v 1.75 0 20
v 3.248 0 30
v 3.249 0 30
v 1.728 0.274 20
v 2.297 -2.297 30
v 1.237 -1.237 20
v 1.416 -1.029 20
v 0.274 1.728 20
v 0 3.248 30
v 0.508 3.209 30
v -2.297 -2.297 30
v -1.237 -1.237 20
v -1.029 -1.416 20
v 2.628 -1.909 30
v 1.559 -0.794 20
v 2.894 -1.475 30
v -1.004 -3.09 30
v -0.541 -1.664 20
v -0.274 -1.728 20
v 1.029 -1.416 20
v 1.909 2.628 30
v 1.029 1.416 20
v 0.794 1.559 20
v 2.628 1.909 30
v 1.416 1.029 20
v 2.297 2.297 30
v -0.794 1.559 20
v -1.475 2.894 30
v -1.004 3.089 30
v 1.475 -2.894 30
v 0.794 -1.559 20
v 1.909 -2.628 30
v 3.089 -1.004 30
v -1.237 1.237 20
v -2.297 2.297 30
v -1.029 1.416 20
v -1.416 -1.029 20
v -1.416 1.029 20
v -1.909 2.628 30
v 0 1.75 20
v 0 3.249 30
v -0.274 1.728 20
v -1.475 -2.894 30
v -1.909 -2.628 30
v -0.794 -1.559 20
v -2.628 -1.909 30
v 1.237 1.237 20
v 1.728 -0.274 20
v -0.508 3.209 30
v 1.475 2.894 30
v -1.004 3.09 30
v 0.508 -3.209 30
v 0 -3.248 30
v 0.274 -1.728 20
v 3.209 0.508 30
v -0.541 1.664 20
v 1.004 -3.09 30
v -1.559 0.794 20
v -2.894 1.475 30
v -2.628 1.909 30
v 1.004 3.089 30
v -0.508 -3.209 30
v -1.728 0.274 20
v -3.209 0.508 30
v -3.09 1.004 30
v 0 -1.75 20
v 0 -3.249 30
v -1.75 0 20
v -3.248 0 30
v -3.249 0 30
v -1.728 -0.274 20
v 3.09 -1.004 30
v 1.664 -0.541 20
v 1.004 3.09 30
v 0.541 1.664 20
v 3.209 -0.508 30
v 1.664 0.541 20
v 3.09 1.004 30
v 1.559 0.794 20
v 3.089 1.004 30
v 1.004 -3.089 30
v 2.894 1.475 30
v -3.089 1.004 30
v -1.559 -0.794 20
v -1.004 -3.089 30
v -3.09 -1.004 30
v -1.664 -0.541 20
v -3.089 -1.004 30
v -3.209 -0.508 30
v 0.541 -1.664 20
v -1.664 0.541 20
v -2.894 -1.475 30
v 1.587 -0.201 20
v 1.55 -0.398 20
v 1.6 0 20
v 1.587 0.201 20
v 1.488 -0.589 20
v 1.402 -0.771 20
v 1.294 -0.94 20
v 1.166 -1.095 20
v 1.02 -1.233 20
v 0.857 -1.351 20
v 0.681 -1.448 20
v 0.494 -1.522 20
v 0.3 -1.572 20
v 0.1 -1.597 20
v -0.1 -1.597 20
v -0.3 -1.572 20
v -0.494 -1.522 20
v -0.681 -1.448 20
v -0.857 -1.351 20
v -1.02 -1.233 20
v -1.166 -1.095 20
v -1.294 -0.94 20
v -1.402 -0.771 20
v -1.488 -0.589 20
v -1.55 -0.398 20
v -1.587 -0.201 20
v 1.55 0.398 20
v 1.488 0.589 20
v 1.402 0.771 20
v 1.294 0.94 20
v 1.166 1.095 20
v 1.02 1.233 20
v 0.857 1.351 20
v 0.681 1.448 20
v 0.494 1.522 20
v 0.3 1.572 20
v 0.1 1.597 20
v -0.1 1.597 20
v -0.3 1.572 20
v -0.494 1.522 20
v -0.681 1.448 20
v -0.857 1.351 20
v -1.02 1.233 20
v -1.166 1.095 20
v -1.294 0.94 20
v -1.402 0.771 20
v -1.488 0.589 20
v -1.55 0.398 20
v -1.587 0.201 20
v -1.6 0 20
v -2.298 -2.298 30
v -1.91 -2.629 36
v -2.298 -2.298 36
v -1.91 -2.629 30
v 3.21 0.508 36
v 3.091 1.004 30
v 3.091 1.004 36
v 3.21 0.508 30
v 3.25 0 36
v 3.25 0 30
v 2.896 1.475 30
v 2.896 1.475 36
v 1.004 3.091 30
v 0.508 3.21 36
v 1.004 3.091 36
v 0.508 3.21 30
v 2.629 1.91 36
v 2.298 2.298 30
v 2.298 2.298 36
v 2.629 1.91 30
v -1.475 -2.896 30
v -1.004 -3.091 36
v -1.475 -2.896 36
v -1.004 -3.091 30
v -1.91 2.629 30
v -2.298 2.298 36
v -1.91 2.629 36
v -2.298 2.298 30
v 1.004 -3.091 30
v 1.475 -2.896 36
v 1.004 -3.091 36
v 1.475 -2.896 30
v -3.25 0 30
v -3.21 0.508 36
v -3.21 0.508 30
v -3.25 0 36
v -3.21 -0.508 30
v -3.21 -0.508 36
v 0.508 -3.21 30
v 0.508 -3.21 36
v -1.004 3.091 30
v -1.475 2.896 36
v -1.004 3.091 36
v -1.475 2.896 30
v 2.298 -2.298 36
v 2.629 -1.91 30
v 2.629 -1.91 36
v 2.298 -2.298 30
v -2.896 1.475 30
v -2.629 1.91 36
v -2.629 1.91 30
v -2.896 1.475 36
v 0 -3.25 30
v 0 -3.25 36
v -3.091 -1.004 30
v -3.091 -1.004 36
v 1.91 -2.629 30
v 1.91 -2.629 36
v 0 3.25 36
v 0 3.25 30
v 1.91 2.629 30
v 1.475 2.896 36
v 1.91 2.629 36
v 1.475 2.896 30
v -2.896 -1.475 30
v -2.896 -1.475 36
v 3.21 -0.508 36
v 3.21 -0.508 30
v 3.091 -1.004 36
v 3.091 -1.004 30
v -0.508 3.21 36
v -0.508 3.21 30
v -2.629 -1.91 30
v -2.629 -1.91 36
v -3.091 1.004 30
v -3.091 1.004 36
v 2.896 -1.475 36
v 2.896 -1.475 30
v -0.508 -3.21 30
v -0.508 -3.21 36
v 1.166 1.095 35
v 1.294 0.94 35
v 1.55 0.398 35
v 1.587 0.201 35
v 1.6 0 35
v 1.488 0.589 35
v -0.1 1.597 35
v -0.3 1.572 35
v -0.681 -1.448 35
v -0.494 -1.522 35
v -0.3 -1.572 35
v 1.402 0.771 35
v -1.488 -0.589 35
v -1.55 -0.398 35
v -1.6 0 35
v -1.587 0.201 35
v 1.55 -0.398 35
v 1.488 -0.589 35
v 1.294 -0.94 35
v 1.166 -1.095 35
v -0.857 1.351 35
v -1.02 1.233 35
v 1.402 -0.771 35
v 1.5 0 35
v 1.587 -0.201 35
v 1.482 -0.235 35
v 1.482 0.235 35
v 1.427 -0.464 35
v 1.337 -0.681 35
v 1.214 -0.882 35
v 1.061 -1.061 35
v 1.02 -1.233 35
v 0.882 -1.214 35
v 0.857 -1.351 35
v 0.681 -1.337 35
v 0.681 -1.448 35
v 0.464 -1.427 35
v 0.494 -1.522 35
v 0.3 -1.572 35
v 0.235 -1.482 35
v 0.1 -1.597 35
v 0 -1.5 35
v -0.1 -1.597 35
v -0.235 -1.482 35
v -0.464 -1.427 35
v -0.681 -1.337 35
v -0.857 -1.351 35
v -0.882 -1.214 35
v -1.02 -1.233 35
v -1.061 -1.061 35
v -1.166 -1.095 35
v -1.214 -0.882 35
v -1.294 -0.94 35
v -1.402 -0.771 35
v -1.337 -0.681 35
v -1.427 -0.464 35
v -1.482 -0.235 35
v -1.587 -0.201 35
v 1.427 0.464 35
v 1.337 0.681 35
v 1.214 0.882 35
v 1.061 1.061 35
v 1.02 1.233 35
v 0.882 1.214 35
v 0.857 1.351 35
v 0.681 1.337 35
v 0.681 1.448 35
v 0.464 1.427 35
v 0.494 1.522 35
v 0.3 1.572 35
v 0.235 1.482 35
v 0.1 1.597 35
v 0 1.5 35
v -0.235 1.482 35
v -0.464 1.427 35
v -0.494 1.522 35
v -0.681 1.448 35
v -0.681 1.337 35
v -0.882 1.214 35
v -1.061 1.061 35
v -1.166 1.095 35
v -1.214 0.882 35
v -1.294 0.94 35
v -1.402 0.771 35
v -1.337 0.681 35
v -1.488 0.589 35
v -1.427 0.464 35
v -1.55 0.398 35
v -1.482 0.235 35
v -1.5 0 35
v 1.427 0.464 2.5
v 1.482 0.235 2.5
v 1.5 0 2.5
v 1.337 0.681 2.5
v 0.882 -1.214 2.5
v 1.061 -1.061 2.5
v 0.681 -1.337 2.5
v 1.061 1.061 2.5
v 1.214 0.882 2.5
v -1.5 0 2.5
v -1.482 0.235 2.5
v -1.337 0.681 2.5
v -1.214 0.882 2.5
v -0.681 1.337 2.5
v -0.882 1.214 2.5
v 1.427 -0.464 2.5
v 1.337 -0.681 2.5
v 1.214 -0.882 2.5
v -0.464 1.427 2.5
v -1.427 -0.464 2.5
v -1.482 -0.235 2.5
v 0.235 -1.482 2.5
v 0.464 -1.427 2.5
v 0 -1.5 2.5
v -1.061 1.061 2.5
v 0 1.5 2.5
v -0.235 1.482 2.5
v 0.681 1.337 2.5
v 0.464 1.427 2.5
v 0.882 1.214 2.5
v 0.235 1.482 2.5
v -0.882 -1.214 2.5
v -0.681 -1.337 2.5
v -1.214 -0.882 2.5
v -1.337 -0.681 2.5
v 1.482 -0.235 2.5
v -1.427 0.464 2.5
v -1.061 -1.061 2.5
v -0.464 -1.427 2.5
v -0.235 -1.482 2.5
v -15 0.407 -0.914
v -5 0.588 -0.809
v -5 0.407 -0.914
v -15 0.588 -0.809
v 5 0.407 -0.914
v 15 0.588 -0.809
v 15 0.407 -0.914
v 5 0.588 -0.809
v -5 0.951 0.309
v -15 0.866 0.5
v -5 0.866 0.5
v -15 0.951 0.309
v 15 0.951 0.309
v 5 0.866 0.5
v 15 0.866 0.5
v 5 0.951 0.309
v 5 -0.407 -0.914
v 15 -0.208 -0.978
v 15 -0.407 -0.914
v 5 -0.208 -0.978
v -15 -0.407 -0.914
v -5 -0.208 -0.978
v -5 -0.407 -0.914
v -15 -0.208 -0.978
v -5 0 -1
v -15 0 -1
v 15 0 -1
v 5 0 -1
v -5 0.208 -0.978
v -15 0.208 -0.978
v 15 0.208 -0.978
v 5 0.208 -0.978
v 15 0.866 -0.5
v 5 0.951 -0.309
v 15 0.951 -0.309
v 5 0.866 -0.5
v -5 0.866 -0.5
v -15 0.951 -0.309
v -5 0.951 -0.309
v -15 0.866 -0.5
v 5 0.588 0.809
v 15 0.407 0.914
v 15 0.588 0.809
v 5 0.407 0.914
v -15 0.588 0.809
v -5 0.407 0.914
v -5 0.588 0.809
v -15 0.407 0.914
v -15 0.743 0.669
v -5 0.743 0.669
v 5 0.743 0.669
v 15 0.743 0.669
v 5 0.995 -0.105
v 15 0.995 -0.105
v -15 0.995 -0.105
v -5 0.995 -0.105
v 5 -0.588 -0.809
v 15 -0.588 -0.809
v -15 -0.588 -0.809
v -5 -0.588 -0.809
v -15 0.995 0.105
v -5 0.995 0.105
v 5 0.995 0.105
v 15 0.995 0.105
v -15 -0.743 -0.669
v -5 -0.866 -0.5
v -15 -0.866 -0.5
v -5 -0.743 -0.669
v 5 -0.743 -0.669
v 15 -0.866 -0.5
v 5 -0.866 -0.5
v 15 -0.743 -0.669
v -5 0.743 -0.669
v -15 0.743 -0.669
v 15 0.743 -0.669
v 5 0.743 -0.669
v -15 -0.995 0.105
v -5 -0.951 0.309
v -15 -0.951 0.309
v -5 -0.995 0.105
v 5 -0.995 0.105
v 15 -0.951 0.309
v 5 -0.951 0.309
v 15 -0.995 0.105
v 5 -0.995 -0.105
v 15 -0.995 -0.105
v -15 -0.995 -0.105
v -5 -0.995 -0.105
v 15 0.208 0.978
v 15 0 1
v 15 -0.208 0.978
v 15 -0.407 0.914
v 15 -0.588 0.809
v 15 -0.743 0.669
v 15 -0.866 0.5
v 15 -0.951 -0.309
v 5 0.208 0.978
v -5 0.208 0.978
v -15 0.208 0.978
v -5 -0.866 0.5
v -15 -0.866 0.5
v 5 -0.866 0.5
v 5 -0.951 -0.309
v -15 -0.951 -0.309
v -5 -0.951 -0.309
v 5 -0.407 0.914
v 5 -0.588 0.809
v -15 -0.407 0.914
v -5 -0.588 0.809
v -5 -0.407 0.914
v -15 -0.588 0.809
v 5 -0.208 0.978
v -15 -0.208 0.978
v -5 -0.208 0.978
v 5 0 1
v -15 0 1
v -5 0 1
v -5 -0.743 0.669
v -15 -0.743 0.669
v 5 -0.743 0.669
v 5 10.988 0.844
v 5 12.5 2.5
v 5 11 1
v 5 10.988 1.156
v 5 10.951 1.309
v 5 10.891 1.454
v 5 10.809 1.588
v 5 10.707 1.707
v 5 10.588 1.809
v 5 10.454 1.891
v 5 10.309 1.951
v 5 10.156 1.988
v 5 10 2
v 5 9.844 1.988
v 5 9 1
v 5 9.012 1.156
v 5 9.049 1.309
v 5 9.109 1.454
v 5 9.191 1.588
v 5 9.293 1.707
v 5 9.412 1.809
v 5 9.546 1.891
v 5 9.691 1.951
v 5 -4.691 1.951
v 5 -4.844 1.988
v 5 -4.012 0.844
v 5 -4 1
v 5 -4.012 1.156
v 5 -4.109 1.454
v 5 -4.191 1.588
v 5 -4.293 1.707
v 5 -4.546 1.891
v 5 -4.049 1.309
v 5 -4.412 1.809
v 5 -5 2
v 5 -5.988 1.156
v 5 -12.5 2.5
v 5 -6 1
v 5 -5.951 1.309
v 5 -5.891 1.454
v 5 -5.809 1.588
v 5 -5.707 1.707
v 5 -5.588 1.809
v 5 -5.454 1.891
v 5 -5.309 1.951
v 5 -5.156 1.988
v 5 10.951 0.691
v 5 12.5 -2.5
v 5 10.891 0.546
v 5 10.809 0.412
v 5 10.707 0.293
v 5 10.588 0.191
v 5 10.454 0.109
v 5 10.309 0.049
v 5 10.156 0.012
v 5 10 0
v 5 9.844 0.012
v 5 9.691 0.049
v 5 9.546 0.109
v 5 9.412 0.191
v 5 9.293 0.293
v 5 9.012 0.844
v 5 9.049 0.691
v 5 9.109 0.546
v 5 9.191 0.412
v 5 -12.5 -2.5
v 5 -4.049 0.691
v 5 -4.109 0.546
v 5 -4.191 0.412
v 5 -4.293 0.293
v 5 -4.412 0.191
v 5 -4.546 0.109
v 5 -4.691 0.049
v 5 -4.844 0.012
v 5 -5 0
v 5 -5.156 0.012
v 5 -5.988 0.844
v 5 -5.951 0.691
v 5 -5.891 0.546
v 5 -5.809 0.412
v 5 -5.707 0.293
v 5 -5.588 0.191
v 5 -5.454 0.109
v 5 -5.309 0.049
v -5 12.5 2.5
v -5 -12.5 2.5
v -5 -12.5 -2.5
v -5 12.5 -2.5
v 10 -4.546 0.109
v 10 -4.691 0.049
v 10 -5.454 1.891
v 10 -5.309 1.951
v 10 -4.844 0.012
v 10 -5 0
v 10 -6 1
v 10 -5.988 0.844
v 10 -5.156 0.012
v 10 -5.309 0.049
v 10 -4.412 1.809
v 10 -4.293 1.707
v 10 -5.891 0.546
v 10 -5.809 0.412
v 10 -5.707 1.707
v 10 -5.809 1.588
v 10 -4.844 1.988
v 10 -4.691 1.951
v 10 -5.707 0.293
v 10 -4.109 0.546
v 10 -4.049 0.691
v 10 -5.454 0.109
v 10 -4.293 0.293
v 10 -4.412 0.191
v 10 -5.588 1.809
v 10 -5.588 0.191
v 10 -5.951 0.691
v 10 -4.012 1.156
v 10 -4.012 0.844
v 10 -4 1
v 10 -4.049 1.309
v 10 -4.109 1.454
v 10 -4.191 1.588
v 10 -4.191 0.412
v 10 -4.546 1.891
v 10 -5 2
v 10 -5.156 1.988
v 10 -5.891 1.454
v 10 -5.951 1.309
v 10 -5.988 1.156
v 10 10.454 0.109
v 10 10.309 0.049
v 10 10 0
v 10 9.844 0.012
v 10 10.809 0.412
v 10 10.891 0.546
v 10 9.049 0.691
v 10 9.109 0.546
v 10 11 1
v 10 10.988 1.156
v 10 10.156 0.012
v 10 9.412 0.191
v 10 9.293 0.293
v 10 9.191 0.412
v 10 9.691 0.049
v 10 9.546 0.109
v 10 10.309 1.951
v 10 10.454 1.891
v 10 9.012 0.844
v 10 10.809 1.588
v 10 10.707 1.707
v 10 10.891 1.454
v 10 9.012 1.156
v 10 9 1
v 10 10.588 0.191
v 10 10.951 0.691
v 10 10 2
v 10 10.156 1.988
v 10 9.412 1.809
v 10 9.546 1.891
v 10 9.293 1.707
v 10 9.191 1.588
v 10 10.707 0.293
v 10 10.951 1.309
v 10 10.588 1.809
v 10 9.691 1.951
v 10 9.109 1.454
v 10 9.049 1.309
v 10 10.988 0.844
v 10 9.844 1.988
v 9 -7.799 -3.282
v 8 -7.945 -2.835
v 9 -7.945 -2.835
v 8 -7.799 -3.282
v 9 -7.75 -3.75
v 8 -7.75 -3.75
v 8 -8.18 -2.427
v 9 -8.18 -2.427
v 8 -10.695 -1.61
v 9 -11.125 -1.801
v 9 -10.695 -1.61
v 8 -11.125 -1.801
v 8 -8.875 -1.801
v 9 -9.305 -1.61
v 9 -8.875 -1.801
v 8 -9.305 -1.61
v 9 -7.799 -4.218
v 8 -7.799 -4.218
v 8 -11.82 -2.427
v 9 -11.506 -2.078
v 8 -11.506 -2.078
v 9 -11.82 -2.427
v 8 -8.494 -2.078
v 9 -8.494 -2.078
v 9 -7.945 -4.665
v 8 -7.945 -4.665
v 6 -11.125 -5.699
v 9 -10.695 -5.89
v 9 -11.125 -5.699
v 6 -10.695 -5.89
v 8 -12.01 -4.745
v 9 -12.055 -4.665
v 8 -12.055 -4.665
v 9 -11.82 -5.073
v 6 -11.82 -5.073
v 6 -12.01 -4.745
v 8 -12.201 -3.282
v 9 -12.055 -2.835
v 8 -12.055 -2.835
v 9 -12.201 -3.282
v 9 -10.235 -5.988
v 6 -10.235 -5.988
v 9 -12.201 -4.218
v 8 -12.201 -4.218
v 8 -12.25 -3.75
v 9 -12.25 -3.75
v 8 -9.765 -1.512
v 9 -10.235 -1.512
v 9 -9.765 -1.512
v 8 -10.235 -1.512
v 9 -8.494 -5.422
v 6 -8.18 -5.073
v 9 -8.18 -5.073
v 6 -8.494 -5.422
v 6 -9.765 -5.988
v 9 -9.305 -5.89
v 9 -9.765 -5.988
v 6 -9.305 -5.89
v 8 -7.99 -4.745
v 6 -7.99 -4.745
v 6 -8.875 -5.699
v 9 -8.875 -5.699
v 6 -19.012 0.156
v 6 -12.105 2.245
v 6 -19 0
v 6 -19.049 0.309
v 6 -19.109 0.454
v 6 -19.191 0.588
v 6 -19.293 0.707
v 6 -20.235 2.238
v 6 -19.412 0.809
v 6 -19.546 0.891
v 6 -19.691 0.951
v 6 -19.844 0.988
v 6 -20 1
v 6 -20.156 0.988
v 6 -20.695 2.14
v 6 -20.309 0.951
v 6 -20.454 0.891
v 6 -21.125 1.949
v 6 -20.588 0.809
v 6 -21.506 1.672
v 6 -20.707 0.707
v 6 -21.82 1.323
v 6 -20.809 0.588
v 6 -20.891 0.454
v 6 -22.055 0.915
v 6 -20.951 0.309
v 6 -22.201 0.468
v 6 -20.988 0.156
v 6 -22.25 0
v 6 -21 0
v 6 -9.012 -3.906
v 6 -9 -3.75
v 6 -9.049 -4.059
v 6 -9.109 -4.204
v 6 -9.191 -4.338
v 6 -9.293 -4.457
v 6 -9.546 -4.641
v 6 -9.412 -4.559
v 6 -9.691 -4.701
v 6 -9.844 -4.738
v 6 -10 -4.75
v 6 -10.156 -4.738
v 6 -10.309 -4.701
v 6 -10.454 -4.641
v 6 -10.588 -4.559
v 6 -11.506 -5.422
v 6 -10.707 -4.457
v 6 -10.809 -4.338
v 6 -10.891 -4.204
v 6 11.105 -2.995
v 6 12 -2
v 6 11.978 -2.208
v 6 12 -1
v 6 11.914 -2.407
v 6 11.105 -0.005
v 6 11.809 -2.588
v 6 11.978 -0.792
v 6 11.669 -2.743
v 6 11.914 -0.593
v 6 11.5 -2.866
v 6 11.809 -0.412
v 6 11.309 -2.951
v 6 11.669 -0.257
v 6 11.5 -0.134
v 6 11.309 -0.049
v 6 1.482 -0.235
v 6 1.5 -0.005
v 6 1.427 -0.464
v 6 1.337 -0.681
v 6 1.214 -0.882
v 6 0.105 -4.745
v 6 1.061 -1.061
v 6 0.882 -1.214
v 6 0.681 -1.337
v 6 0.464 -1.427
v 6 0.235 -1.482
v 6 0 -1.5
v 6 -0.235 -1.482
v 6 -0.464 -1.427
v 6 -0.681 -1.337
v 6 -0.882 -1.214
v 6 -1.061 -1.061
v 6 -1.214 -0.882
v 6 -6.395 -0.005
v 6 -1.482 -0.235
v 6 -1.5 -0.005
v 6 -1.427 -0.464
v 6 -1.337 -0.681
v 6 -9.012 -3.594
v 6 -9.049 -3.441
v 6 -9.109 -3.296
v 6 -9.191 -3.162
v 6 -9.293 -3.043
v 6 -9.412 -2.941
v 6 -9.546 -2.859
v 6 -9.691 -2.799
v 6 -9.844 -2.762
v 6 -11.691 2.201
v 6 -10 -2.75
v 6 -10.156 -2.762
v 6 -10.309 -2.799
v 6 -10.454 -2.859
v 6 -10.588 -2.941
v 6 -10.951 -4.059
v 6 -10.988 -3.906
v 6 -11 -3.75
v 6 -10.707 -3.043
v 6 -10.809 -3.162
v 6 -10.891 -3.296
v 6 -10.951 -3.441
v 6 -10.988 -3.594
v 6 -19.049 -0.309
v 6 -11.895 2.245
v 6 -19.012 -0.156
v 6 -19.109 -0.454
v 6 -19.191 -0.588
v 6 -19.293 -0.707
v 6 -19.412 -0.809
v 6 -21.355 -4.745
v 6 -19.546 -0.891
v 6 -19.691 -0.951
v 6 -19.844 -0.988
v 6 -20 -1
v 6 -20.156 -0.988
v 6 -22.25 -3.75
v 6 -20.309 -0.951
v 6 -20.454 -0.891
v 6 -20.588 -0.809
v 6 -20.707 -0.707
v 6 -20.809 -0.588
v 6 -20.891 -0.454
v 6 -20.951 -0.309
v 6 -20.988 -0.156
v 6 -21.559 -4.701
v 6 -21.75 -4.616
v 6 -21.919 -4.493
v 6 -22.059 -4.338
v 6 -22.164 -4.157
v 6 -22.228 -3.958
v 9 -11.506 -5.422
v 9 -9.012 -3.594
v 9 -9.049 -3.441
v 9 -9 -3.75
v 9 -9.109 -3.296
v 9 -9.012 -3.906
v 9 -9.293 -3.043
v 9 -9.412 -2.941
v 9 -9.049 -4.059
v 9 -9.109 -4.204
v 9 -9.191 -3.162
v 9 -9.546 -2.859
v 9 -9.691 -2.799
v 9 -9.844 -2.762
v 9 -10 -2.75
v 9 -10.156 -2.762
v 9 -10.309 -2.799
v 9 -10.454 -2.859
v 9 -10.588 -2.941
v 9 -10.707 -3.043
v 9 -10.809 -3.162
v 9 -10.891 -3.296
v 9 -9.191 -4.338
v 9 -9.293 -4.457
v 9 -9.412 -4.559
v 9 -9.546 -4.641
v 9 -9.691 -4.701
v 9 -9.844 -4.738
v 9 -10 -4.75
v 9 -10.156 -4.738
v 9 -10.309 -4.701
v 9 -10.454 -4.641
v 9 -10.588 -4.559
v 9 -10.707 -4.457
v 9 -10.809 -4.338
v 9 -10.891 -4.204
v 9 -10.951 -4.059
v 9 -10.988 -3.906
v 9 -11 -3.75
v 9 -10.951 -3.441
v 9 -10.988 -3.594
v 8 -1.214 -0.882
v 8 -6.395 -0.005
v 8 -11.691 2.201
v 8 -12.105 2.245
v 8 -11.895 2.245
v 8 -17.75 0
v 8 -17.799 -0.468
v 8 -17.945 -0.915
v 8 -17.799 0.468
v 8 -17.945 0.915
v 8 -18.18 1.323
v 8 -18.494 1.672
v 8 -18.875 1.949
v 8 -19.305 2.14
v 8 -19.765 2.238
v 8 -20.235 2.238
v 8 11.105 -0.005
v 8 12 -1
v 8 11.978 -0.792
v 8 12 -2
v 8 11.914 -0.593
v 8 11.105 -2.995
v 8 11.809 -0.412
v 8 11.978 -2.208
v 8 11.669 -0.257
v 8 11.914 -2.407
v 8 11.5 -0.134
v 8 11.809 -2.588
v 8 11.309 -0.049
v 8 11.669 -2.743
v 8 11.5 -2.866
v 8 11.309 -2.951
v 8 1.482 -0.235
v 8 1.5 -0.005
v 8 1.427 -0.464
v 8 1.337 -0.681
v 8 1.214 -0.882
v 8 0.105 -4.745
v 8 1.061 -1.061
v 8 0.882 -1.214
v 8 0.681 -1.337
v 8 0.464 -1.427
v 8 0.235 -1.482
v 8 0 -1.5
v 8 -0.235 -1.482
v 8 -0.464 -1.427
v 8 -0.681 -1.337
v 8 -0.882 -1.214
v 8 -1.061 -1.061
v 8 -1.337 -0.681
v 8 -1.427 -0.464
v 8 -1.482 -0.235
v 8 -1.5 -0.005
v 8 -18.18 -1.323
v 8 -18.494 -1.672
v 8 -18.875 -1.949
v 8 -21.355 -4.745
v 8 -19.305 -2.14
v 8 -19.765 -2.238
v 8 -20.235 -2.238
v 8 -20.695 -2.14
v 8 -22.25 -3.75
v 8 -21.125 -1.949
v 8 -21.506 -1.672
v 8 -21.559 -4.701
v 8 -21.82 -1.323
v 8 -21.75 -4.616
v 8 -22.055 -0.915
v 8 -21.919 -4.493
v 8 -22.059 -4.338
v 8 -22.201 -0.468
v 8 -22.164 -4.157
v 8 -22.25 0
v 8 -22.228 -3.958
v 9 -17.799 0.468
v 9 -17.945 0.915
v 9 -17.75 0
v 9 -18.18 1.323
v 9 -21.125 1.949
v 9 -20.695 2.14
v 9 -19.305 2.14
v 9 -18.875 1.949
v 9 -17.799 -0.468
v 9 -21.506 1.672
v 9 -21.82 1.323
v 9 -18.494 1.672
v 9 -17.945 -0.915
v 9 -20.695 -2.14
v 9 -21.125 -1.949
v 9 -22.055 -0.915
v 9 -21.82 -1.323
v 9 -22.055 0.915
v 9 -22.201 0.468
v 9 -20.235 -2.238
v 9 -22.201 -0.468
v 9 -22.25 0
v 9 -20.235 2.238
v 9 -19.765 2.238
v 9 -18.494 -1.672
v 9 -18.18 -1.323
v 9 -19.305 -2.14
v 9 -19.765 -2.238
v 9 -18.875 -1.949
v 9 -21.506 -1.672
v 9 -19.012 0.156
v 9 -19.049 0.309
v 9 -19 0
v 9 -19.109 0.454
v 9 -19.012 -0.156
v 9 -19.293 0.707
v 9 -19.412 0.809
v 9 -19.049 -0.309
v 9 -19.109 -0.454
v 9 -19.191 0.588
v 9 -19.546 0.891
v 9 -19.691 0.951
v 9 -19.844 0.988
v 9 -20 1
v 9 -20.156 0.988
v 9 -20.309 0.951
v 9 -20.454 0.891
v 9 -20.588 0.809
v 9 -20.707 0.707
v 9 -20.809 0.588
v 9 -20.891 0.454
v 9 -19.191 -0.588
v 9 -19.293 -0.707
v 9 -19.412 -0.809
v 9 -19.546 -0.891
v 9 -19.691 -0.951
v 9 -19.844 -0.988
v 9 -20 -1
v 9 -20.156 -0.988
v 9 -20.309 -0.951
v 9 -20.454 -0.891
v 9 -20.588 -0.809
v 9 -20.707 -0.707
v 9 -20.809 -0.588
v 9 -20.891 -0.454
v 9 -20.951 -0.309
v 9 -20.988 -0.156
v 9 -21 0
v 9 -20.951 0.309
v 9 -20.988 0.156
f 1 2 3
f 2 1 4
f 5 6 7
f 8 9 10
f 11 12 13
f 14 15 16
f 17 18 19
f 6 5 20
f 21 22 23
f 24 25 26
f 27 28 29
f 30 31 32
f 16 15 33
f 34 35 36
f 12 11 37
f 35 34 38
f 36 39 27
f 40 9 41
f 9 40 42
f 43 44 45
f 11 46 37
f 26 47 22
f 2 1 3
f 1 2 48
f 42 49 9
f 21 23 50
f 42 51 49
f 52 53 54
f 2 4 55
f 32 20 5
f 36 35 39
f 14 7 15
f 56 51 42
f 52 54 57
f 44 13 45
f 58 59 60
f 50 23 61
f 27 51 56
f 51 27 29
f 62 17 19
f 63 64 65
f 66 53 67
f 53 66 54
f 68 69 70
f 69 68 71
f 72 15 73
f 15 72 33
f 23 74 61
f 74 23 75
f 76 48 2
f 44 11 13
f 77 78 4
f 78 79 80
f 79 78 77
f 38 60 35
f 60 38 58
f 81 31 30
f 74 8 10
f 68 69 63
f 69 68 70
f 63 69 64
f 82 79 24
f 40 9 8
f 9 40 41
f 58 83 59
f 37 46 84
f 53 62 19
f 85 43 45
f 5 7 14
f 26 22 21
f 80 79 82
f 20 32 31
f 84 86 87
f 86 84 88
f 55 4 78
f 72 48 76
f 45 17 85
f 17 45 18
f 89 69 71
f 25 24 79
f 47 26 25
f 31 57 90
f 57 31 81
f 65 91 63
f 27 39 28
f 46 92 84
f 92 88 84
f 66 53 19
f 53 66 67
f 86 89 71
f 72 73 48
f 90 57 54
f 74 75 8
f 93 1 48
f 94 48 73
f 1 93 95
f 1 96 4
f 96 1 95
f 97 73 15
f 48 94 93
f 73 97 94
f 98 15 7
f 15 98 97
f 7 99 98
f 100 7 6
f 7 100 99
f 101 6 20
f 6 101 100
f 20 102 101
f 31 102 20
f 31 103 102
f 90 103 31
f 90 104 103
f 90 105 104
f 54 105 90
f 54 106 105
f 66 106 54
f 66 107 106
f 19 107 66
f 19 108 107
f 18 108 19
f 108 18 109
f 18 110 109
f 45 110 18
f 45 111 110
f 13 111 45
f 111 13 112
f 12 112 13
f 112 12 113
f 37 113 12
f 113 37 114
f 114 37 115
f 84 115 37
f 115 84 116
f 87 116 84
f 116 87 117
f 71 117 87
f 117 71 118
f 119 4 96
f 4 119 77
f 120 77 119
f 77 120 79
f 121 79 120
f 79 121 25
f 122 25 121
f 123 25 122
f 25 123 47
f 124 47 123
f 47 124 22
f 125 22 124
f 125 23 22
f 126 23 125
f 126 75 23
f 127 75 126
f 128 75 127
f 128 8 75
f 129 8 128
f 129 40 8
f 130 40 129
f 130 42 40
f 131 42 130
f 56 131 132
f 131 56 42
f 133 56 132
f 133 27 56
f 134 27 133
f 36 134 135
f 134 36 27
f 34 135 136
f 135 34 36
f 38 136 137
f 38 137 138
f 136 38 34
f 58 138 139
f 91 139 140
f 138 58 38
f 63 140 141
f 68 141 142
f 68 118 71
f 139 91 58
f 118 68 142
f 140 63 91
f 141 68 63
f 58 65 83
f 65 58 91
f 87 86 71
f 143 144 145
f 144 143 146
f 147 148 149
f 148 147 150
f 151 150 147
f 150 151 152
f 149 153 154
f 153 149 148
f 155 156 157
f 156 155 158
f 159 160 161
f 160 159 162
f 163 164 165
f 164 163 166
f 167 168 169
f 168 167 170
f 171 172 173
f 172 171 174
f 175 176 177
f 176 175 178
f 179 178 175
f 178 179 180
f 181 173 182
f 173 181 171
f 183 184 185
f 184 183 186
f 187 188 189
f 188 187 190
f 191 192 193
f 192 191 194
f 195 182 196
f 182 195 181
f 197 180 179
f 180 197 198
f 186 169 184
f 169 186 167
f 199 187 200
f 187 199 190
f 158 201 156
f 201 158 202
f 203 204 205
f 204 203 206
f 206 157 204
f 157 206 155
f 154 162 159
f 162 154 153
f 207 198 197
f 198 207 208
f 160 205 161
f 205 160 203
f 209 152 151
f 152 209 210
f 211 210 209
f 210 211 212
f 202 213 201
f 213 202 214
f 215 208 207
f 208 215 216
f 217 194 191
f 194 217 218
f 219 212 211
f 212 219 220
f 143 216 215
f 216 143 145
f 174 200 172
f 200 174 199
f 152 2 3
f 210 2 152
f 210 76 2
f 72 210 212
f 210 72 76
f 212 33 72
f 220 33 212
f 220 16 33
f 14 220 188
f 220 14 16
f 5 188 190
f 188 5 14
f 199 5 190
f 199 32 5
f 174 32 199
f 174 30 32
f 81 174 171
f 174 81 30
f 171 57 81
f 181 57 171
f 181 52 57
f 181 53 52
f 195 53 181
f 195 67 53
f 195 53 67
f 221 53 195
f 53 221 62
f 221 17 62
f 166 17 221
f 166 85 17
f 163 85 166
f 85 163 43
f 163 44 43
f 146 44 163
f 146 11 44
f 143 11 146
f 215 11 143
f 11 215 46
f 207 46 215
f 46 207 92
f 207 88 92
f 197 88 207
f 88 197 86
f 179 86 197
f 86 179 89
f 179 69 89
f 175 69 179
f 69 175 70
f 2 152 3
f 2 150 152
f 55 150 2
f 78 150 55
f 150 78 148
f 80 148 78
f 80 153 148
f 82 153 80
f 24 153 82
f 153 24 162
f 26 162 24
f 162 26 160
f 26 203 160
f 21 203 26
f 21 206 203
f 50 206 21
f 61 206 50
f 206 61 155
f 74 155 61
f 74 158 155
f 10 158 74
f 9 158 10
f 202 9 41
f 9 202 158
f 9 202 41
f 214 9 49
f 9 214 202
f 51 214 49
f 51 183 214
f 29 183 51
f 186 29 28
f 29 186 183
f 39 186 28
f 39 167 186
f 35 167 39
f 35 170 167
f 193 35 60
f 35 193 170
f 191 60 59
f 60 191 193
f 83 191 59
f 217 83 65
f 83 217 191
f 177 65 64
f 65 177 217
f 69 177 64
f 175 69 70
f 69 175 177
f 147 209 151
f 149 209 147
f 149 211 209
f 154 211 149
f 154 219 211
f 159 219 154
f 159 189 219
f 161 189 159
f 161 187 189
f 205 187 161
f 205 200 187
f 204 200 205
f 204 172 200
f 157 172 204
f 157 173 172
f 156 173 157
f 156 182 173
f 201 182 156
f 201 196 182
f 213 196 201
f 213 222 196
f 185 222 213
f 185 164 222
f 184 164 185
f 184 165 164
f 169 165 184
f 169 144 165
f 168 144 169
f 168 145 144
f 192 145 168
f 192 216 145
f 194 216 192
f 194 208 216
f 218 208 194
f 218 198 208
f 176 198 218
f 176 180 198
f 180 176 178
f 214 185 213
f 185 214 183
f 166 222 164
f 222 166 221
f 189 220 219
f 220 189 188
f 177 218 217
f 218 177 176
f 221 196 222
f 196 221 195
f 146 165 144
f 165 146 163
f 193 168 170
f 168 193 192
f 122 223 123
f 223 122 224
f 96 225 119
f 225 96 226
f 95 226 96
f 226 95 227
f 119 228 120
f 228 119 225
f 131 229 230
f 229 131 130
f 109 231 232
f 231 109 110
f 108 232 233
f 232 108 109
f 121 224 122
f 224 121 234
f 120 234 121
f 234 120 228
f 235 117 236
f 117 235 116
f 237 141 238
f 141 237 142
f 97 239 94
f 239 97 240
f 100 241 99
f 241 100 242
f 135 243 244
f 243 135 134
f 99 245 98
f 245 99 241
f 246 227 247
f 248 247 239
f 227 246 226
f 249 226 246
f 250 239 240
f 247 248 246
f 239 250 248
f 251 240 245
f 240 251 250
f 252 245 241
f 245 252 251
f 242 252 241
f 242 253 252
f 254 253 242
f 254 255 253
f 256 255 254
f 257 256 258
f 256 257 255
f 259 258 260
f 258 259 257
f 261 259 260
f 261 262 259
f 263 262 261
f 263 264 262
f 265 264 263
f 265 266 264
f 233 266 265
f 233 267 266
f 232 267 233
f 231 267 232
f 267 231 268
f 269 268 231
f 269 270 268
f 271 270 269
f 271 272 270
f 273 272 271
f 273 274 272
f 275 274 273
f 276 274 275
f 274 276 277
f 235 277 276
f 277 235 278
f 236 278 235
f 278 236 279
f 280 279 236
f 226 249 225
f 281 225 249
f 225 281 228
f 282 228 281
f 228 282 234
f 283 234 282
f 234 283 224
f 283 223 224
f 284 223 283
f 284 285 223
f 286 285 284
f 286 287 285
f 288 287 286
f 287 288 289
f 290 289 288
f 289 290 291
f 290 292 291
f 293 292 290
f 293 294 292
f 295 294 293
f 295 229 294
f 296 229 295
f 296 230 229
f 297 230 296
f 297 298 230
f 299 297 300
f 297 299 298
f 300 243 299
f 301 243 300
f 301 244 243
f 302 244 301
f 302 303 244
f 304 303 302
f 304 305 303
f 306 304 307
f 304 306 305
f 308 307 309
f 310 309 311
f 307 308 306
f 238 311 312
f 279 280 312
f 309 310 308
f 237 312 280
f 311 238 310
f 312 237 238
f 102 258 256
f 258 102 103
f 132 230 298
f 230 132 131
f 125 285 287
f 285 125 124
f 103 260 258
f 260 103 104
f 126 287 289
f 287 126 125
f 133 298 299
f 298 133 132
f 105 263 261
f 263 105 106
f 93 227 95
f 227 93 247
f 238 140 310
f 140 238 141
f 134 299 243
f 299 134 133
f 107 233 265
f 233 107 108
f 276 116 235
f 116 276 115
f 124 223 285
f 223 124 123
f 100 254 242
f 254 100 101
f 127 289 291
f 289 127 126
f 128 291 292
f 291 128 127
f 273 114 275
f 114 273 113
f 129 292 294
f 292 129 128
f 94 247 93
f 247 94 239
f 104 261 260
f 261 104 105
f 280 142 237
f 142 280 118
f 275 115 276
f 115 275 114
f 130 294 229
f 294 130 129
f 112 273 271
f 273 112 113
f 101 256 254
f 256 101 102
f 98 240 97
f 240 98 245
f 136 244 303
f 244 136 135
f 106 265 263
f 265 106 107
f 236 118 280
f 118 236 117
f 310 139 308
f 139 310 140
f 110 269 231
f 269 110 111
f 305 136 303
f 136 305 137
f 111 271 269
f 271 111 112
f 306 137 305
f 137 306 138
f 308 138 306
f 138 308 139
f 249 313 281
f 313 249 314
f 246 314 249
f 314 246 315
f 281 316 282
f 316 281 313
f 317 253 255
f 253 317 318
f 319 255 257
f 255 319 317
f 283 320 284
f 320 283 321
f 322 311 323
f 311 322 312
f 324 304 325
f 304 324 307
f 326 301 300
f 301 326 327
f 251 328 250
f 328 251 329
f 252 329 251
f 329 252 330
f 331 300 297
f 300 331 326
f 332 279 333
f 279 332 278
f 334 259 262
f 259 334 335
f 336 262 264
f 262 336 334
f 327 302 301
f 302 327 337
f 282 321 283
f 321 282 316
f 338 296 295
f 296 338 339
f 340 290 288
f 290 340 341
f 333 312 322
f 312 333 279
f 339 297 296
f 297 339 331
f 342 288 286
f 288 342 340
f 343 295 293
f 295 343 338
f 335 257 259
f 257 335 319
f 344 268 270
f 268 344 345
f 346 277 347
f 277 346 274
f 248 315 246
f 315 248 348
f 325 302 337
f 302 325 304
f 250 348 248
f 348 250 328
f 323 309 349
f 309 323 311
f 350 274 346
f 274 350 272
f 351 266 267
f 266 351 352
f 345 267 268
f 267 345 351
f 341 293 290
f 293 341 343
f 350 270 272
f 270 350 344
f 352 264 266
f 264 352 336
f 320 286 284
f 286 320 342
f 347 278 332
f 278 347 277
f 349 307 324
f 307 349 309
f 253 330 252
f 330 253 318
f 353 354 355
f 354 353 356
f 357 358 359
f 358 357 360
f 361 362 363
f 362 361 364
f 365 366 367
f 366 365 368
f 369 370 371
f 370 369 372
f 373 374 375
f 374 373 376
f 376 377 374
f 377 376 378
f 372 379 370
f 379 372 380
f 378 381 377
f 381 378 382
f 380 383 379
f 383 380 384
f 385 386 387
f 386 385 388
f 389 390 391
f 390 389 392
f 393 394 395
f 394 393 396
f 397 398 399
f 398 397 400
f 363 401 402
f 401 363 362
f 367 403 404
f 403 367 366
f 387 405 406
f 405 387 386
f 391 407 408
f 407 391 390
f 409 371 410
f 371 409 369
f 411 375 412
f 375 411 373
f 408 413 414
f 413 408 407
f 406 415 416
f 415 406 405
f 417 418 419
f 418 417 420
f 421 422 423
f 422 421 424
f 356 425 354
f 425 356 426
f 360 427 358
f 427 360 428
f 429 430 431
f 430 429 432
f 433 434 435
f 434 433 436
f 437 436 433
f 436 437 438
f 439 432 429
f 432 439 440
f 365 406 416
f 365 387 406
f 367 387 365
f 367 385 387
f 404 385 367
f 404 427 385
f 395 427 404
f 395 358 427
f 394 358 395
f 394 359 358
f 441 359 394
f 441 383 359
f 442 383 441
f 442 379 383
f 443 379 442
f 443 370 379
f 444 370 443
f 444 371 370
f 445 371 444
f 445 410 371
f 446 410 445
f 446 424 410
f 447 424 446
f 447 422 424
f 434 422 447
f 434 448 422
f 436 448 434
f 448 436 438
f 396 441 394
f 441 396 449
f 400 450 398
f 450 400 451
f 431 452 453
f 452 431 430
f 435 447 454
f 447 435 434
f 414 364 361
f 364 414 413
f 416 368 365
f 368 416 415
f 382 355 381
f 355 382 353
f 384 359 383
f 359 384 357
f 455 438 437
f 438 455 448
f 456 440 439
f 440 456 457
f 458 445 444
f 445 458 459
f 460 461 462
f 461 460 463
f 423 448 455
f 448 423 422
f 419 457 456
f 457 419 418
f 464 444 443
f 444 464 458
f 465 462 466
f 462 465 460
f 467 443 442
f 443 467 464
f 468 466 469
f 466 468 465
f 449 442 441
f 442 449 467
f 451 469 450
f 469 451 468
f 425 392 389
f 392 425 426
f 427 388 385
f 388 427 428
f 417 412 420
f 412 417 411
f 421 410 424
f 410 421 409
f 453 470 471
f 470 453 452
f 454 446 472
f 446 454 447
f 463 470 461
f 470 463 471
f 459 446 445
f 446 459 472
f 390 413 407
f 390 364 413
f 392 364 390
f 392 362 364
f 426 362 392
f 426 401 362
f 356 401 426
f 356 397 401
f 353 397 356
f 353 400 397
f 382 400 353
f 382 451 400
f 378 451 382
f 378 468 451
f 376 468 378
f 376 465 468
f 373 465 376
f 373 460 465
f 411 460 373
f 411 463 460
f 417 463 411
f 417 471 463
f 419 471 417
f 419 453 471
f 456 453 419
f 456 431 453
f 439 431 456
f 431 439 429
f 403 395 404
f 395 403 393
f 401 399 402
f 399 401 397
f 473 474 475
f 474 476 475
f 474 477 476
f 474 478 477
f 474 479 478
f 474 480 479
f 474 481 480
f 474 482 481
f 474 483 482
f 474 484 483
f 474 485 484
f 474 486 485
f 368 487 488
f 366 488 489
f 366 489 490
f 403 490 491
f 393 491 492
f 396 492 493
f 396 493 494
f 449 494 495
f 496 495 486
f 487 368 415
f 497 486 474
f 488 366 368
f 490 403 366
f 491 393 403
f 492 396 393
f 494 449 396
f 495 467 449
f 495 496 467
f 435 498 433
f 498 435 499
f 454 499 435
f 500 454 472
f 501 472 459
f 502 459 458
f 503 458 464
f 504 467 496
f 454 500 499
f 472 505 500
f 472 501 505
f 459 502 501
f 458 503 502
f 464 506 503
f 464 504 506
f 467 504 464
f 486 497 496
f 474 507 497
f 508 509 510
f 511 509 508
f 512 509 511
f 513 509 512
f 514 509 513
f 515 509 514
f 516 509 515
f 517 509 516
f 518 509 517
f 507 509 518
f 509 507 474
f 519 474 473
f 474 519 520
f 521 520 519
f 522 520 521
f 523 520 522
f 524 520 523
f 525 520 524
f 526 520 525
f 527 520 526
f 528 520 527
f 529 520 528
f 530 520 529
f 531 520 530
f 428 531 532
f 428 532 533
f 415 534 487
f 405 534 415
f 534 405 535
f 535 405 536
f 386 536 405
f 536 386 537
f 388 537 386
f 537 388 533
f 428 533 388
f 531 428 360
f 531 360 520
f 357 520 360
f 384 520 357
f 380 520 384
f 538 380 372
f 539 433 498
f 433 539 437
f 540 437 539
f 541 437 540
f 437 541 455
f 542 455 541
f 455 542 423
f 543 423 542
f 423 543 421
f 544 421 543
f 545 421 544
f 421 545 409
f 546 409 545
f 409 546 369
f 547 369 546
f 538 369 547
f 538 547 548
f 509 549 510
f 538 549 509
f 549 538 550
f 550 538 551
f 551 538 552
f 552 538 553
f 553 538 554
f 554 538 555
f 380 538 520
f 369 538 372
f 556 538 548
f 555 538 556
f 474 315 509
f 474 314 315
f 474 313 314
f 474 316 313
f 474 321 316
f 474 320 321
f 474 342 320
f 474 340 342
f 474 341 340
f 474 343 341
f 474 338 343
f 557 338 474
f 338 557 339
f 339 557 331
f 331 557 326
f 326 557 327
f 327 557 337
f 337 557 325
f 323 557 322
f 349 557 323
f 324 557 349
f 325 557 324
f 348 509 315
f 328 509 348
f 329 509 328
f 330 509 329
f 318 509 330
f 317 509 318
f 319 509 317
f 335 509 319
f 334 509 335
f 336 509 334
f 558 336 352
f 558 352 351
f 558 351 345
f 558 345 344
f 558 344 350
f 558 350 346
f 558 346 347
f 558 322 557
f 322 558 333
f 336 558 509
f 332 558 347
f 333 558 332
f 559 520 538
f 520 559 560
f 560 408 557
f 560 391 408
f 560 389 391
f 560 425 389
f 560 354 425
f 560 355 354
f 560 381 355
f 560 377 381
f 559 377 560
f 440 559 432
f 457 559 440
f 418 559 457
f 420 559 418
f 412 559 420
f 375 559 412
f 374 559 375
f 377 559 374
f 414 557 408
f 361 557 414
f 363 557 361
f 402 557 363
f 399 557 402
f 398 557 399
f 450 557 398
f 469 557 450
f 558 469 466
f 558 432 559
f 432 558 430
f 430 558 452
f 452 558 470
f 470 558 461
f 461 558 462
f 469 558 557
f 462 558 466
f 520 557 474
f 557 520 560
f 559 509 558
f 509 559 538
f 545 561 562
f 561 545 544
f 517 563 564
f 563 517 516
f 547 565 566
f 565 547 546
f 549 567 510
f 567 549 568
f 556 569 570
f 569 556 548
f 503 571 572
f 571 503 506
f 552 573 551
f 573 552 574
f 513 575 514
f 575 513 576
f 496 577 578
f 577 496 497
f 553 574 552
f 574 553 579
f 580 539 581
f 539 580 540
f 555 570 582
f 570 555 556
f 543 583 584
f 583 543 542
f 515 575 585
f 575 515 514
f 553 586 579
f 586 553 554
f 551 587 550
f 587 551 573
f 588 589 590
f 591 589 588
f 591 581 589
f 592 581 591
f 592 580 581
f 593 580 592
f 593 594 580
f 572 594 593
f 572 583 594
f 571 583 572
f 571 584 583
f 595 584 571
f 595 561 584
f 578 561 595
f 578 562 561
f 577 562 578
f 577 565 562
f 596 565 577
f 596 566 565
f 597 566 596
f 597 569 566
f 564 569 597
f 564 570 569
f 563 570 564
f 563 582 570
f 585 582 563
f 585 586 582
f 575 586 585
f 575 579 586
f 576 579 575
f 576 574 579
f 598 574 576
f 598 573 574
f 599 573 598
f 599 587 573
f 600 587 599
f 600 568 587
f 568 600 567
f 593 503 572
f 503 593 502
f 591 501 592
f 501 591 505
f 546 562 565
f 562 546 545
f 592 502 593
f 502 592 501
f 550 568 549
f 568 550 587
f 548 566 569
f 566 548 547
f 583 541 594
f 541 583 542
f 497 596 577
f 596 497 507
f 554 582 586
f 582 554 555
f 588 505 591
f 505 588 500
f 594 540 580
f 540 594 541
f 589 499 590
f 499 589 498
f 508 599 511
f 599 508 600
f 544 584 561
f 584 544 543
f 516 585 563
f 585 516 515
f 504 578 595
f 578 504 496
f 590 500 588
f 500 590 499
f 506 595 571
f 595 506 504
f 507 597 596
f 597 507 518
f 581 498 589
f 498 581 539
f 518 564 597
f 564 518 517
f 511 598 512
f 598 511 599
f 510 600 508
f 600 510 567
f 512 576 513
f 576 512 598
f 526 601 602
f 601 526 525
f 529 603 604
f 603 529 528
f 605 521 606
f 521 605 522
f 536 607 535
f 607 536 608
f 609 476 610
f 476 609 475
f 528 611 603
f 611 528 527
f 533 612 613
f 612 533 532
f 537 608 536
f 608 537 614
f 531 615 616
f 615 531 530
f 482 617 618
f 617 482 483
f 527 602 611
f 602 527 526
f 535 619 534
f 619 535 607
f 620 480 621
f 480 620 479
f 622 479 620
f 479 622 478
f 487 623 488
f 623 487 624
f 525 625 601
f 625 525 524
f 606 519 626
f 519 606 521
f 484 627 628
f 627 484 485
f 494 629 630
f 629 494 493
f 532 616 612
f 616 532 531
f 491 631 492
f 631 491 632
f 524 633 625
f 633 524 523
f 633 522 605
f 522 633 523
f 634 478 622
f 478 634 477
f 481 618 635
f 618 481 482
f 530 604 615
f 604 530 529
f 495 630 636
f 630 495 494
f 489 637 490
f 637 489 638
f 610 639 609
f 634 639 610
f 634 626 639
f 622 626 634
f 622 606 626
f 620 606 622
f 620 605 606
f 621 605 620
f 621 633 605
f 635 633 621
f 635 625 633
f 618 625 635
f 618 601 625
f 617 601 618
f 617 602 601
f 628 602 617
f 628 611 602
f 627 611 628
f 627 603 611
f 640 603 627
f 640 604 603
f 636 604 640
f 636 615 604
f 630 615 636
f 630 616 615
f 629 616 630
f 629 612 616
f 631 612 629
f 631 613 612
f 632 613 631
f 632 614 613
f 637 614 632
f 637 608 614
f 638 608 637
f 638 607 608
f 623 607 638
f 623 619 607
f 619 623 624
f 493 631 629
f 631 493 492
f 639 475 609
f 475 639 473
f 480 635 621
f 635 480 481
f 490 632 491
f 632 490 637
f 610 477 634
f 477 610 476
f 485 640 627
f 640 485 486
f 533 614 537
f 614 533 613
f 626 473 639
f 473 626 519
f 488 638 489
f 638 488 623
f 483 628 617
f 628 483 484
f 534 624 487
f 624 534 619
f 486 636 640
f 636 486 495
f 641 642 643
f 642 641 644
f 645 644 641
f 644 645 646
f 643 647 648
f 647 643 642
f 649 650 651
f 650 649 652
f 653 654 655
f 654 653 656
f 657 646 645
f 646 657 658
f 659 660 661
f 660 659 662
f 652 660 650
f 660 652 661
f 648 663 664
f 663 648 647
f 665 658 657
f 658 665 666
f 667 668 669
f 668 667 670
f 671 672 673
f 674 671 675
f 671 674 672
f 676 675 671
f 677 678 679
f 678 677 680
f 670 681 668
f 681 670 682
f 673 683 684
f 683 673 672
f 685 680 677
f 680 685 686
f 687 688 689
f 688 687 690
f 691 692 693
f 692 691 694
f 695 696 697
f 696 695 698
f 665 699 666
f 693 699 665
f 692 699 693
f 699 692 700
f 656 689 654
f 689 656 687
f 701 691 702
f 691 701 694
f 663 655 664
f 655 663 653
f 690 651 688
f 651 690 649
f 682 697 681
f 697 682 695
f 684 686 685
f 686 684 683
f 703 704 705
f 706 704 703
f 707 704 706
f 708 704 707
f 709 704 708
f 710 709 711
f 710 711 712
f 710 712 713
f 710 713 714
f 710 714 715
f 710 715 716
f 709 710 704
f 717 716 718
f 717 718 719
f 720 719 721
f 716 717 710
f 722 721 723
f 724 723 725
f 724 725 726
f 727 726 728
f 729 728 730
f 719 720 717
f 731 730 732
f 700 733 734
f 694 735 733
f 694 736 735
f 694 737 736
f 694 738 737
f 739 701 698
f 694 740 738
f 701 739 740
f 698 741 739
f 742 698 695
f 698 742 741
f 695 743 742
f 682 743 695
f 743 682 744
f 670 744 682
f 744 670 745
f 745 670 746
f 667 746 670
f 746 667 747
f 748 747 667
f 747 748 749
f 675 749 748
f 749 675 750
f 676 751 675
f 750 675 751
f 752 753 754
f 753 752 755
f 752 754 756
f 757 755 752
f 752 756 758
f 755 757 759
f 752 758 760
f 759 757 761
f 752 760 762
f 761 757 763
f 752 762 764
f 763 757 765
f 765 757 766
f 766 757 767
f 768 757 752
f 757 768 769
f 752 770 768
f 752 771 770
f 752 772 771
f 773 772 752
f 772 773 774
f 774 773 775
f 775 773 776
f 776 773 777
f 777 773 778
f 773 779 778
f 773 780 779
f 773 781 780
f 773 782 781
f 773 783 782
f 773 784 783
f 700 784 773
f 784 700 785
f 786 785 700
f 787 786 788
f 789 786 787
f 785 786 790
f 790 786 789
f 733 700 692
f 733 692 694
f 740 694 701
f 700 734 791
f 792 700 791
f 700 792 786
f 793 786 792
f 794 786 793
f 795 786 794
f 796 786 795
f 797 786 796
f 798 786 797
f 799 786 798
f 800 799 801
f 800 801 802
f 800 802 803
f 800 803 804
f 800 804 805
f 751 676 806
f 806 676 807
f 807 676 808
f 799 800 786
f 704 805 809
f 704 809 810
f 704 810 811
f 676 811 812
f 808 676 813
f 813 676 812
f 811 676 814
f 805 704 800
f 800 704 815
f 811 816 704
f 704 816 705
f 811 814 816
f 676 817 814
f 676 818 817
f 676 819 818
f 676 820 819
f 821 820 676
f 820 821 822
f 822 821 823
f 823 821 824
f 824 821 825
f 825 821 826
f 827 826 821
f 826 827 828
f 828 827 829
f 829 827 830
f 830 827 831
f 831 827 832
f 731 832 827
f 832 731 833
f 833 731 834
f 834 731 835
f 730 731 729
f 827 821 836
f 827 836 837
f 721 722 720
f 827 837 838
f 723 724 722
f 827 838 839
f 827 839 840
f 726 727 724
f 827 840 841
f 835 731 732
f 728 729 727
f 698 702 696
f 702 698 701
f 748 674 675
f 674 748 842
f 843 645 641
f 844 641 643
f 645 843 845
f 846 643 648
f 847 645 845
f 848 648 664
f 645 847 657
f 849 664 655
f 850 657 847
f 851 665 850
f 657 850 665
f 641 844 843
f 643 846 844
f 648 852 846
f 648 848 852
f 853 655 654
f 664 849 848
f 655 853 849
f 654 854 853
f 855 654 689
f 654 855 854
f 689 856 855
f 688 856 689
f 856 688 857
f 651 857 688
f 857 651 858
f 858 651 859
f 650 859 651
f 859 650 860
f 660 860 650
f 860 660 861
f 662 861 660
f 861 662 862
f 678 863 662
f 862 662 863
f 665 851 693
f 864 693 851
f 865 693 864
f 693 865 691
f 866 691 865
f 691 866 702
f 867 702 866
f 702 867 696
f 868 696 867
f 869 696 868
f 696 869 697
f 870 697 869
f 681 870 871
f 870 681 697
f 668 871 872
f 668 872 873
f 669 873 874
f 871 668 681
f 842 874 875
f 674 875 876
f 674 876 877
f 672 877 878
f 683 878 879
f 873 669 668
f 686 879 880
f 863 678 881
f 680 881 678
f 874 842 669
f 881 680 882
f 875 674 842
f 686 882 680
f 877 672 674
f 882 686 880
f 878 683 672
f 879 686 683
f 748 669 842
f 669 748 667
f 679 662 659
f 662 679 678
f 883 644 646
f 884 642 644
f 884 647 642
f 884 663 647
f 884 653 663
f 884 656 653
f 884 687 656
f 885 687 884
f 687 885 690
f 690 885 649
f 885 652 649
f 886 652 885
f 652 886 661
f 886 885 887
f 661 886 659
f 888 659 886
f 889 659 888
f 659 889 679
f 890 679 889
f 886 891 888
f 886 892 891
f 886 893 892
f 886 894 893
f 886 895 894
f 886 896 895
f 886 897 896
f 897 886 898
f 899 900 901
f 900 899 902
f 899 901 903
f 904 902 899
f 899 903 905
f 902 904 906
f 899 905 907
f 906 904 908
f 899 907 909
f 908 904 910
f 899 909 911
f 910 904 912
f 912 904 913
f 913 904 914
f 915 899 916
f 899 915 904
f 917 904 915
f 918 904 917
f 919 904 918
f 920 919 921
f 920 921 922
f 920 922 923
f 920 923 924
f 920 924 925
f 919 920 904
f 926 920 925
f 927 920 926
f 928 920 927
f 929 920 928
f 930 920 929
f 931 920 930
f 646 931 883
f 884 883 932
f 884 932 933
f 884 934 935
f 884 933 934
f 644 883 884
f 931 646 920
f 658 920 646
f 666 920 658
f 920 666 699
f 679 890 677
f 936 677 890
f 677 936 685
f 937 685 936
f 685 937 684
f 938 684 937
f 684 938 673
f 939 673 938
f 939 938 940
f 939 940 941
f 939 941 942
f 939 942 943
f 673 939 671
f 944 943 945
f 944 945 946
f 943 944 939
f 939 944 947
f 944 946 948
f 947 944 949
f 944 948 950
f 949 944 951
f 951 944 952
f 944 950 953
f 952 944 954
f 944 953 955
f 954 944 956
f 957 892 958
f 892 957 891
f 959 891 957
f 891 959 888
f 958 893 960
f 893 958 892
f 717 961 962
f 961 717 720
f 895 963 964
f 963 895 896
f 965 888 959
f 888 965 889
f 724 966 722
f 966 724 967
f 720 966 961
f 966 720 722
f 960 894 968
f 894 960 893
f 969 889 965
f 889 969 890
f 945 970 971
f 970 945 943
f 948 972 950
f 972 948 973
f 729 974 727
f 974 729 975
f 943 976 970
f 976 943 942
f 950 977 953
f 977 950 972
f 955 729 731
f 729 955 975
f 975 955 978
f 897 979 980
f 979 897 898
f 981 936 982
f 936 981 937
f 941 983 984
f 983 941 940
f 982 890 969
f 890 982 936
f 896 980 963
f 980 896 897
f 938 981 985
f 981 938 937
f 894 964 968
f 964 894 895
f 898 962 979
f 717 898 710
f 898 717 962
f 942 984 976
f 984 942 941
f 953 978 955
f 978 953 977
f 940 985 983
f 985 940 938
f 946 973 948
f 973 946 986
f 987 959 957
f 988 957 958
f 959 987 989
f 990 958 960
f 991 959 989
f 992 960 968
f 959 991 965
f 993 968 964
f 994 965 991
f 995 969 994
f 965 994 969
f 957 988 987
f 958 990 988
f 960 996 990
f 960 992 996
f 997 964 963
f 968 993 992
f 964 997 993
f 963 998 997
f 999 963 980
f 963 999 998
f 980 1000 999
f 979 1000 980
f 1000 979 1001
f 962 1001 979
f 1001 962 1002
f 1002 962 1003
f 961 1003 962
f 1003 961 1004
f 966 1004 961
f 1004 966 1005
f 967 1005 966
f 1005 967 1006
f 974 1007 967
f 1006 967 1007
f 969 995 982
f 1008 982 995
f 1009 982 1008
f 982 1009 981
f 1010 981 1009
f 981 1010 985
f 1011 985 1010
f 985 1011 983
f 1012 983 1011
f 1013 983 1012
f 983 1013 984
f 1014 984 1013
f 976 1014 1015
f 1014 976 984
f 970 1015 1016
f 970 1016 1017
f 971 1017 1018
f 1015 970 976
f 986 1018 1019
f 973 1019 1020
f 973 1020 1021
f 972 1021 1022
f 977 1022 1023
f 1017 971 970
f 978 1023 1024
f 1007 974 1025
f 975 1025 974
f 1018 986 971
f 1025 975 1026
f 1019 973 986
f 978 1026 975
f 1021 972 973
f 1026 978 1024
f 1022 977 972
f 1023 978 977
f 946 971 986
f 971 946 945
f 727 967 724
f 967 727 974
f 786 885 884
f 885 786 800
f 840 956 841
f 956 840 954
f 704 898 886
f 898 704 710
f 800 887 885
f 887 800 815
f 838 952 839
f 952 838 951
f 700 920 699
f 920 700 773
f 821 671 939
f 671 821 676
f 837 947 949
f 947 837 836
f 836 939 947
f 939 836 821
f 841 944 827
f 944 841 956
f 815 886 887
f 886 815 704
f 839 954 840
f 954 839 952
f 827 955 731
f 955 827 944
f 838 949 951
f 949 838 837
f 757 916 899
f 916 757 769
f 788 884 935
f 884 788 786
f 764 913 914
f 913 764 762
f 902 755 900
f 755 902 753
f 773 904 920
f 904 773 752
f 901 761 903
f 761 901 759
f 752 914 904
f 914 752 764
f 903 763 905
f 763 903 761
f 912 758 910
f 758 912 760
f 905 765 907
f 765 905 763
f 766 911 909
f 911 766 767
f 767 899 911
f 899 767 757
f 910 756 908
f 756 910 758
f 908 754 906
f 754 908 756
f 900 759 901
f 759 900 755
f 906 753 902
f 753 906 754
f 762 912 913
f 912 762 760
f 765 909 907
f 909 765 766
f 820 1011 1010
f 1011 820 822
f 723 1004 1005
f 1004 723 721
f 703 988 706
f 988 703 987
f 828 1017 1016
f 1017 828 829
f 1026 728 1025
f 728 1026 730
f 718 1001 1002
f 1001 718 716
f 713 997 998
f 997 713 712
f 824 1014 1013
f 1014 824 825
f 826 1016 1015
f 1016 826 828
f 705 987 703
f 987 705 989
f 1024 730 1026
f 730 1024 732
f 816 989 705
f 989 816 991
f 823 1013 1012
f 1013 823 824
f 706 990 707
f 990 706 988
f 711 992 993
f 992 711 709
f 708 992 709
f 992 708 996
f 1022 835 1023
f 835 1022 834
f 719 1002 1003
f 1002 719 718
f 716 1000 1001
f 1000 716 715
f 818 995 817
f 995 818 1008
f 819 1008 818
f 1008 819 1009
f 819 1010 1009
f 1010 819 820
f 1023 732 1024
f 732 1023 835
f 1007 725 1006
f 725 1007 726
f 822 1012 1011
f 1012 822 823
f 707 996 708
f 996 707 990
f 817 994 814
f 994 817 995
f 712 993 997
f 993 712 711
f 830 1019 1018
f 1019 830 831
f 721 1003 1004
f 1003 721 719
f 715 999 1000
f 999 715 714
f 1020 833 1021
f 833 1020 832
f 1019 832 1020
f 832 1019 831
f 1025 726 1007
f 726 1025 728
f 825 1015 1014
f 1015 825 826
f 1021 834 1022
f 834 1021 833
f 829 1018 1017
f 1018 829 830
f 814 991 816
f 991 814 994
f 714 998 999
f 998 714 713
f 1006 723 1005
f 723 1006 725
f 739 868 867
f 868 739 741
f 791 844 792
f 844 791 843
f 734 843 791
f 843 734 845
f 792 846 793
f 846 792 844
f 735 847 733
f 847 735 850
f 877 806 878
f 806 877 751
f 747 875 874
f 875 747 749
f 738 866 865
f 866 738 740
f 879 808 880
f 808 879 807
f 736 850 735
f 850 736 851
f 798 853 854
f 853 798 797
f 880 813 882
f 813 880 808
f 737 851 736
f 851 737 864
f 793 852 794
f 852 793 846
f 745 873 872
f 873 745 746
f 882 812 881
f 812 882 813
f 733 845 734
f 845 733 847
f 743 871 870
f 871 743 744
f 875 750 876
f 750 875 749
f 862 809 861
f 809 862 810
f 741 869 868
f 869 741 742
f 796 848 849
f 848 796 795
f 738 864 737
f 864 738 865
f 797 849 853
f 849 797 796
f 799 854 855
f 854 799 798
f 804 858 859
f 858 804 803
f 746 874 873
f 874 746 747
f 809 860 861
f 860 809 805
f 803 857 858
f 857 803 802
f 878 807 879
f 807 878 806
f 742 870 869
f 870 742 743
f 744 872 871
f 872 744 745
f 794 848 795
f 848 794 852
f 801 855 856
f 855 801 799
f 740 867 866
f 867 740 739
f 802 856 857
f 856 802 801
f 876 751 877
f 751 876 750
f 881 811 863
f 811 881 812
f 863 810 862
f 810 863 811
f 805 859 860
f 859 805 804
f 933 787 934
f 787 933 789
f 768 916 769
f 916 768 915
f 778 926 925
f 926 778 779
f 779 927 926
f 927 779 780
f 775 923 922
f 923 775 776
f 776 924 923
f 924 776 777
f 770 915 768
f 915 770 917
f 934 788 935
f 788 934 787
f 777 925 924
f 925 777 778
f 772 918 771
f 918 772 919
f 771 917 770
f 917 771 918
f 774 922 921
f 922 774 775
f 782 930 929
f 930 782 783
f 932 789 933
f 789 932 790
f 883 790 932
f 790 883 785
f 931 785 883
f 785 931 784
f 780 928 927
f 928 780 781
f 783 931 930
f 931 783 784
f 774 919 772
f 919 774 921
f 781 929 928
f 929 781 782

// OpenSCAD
rkrparam0=[31,10,20,3.0];// size,spring,axle,scalefactor
rkrparam=concat(rkrparam0,
    [1, //pin lift
    -rkrparam0[2]/(rkrparam0[3]+1), // near pin offset
    rkrparam0[2]/(rkrparam0[3]-1)]); // far pin offset

module rotary6() let(flatspot=1.5)
color([.2,.2,.2]) intersection() {
    cylinder(d=6,h=6.5,$fn=32);
    translate([flatspot,0,0])cube([6,6,15],center=true);
}
    
module rv09()
{
    cylinder(d=6.5,h=0.5,$fn=30);
    rotary6();
    translate([-9.8/2,-6.5,-5])cube([9.8,12,5]);
    translate([0,-6.5,-3.5])
    for(x=[-2.5,0,2.5]) translate([x,0,0])
        rotate([90,0,0])
        cylinder(d=.5,h=3.5);
}

module center()
{
}

module xmount()
{
}

module xrocker(ssy=0)
{
    da=2.0;
    dm=4.5;
    hm=3;
    hh=2;
    wid=7;
    sz=rkrparam[0];
    axis=rkrparam[2];
    ssx=rkrparam[1];
            ty=wid-dm/2-da/2;
            tx=(dm-da)/2;
    difference() {
    union() {
        cylinder(d=dm,h=hm,$fn=30);
        translate([ssx,-ty+ssy]) {
            cylinder(d=dm,h=hm,$fn=30);
            translate([-dm/2,0]) cube([dm,wid-dm/2-da/2-ssy,hh]);
        }
        hull() {
            cylinder(d=dm,h=hh,$fn=30);
            for(t=[[-tx,-ty],[ssx-da,tx],[ssx,-ty],[axis,-ty]])
              translate(t)cylinder(d=da,h=hh,$fn=30);
        }
        hull()
        for(t=[[ssx,-da/2],[sz,-da/2],[axis,-ty],[sz,-da]])
           translate(t)cylinder(d=da,h=hh,$fn=30);
    //translate([0,-wid+dm/2,0])cube([sz,wid-dm/2,hh]);
    }
    for(t=[[0,0],[ssx,-ty+ssy]])
        translate(t)
            cylinder(d=da,h=hm*3,center=true,$fn=40);
    translate([axis,0,0])
        cylinder(d=dm/1.5,h=hm*3,center=true,$fn=40);
    }
}

module xcap()
{
}

module ymount()
{
}

module yrocker()
{
}

module axle(l=10)
    color([0.6,.6,.6]) cylinder(d=2,h=l,$fn=40);
module stick()
    color([0.6,.6,.6]) cylinder(d=3,h=35,$fn=40);

module stickcap()
color([0.2,.2,.2]) difference() {
    union() {
    cylinder(d1=3.5,d2=6.5,h=10.01,$fn=40);
    translate([0,0,10])cylinder(d=6.5,h=6,$fn=40);
    }
    cylinder(d=3.2,h=15*2,center=true,$fn=50);
}

module assembly()
{
    stick();
    translate([0,0,35-15])stickcap();
    color("red")
    rotate([0,90,0])cylinder(d=2,h=30,center=true,$fn=30);
    cube([10,25,5],center=true);
    translate([0,rkrparam[5],rkrparam[4]])
        rotate([0,90,0])axle();
    translate([0,rkrparam[6],rkrparam[4]])
        rotate([0,90,0])axle();
}

module rockertest()
{
    a=30*sin($t*360);
    rotate([a,0,0]) assembly();
    translate([6,-rkrparam[2],0])
    rotate([90,0,90])
    rotate([0,0,-abs(a/rkrparam[3])])
        color("red")xrocker();
}

rockertest();
